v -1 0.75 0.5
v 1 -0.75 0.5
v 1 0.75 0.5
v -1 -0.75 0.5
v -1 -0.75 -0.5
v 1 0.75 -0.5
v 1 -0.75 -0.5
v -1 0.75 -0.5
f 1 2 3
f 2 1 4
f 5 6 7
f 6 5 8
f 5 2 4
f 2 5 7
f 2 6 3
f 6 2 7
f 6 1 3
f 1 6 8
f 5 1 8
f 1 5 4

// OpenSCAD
module motor(){
    cube([2,1.5,1],center=true);
}

motor();
